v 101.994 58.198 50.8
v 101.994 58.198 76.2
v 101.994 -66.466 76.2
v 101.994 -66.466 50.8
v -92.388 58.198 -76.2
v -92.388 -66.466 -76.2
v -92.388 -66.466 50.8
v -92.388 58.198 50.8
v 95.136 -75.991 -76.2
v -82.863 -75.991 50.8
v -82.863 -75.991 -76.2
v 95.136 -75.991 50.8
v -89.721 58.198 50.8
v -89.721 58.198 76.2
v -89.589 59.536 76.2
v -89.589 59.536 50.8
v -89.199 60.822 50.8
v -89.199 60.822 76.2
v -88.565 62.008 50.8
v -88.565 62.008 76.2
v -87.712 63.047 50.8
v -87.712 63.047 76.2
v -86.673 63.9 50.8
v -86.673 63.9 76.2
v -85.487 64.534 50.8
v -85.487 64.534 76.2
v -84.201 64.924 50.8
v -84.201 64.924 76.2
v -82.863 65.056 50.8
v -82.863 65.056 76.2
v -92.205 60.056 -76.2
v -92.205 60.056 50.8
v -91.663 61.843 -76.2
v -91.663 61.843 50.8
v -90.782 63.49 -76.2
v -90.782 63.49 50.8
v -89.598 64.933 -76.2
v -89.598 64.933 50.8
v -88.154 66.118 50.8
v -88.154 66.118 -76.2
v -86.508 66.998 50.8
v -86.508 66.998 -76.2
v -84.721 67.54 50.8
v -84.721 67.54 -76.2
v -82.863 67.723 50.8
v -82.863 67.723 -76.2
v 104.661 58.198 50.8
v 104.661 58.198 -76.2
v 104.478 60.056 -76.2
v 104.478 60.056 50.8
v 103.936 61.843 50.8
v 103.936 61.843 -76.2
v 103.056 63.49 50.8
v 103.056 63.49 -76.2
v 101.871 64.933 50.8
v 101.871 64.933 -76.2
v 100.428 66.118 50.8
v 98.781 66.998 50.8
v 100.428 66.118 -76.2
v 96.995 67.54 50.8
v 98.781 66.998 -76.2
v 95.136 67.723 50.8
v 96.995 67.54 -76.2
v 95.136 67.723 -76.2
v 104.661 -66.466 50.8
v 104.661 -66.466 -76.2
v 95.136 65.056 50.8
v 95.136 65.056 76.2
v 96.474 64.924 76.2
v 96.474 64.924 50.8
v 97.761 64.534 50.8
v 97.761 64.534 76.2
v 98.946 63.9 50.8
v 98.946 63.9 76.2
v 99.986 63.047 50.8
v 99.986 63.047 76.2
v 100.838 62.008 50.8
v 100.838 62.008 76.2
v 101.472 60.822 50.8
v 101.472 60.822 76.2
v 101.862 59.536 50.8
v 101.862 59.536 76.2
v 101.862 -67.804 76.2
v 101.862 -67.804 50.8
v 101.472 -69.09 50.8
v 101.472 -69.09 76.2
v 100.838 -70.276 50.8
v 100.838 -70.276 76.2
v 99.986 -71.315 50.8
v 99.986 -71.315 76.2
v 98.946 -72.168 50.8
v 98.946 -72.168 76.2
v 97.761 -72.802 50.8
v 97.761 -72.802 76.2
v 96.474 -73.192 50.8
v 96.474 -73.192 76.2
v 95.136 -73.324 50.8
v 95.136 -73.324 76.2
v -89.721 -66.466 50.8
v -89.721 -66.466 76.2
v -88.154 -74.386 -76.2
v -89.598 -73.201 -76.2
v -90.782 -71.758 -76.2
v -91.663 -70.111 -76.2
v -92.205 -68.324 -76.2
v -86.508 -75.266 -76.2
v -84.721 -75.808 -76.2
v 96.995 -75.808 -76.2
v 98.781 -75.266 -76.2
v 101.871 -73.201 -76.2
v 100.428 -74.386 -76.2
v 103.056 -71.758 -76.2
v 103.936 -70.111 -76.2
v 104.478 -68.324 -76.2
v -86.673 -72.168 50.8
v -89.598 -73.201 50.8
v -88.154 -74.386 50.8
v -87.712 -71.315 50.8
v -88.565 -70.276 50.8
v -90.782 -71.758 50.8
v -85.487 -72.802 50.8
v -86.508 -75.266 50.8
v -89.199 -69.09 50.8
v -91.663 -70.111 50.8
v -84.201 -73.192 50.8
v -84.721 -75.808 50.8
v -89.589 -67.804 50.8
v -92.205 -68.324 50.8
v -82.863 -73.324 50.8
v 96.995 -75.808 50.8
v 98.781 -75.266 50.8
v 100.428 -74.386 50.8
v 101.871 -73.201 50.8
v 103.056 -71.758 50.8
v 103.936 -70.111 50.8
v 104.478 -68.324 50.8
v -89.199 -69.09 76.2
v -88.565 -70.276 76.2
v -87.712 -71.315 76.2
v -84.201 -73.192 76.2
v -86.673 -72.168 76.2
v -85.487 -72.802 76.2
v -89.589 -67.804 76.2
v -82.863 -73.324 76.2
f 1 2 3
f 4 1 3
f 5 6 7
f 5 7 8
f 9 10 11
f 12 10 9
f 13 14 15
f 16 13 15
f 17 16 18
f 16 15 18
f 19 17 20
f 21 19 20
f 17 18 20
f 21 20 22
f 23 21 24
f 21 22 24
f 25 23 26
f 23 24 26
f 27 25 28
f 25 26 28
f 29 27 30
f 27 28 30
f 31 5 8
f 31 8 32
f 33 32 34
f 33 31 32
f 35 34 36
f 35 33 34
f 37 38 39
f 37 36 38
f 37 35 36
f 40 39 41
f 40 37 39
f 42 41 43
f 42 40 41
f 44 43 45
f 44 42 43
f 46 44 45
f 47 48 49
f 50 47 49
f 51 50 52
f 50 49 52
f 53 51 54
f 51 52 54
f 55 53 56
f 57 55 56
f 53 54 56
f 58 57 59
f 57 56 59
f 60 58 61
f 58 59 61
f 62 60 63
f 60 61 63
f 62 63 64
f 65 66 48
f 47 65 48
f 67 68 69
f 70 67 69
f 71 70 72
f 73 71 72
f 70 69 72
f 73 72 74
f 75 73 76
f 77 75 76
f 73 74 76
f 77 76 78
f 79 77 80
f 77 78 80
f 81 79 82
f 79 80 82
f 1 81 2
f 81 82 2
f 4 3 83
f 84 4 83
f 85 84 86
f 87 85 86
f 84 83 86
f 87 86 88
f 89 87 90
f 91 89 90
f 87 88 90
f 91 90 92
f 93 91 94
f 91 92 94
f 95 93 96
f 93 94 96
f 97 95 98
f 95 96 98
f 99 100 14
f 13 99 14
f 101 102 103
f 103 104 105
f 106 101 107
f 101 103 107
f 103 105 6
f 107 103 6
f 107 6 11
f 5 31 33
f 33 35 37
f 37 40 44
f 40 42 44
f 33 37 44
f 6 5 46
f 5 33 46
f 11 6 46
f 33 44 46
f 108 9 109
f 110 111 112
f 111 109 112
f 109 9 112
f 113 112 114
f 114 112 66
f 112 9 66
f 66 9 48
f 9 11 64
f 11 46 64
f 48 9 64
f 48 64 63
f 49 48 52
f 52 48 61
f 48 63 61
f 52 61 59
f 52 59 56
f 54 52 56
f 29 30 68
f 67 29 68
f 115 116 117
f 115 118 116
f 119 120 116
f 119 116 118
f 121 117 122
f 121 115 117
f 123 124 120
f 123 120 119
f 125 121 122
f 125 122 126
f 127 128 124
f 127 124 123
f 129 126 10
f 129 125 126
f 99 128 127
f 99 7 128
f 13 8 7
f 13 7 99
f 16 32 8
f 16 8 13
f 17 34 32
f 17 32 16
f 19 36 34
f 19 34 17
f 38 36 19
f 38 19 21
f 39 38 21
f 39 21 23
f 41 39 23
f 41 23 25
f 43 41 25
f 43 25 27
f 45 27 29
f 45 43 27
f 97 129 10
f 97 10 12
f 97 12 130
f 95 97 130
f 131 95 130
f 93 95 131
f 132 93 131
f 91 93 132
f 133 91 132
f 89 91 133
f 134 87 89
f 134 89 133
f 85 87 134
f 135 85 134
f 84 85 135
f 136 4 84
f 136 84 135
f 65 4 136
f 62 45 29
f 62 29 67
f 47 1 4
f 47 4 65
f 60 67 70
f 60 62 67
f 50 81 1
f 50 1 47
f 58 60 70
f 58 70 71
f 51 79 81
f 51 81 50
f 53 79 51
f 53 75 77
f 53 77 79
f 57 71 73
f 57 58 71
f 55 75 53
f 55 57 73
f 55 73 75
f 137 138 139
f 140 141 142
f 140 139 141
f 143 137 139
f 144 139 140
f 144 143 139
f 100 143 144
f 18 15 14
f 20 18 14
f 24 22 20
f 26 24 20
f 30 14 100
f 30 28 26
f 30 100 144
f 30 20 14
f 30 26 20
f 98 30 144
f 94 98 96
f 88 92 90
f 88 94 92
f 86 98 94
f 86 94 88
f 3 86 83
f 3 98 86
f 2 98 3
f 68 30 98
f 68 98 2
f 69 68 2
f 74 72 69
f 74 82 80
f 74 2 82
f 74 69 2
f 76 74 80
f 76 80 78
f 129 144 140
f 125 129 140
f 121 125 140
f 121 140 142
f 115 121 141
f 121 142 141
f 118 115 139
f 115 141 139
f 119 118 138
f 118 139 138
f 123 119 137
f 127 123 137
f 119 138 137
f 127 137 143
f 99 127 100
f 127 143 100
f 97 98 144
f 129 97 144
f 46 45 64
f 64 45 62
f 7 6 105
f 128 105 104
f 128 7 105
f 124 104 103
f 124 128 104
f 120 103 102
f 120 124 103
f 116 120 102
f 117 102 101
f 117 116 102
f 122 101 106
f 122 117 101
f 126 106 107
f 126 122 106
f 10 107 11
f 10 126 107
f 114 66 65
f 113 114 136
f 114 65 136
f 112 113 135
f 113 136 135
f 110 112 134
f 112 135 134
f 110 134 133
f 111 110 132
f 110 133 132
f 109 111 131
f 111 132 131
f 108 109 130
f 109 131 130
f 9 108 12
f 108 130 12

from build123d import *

# Parameters (mm, degrees)
F0_W     = 197.0488578081
F0_H     = 143.7139809132
F1_DEPTH = 76.2
F2_R     = 9.525
F4_DEPTH = 25.4


with BuildPart() as f1:
    # F0 (on Top) → F1 (new body, symmetric)
    with BuildSketch(Plane.XY):
        with Locations((6.136842072, -4.1339993477)):
            Rectangle(F0_W, F0_H)
    extrude(amount=F1_DEPTH, both=True)

    # F2
    f2_edges = [f1.edges().sort_by_distance(p)[0] for p in [
        (-92.387587, -75.99099, 0),
        (-92.387587, 67.722991, 0),
        (104.661271, 67.722991, 0),
        (104.661271, -75.99099, 0),
    ]]
    fillet(f2_edges, radius=F2_R)

    # F3 (on face) → F4 (cut)
    with BuildSketch(Plane.XY.offset(76.2)):
        with BuildLine():
            Line((95.1362709761, 67.7229911089), (-82.862586832, 67.7229911089))
            ThreePointArc((-82.862586832, 67.7229911089), (-89.5977789228, 64.9331831997), (-92.387586832, 58.1979911089))
            Line((-92.387586832, 58.1979911089), (-92.387586832, -66.4659898043))
            ThreePointArc((-92.387586832, -66.4659898043), (-89.5977789228, -73.2011818951), (-82.862586832, -75.9909898043))
            Line((-82.862586832, -75.9909898043), (95.1362709761, -75.9909898043))
            ThreePointArc((95.1362709761, -75.9909898043), (101.8714630669, -73.2011818951), (104.6612709761, -66.4659898043))
            Line((104.6612709761, -66.4659898043), (104.6612709761, 58.1979911089))
            ThreePointArc((104.6612709761, 58.1979911089), (101.8714630669, 64.9331831997), (95.1362709761, 67.7229911089))
        make_face()
        with BuildLine():
            ThreePointArc((-89.720586832, 58.1979911089), (-87.7119251374, 63.0473294143), (-82.862586832, 65.0559911089))
            Line((-82.862586832, 65.0559911089), (95.1362709761, 65.0559911089))
            ThreePointArc((95.1362709761, 65.0559911089), (99.9856092814, 63.0473294143), (101.9942709761, 58.1979911089))
            Line((101.9942709761, 58.1979911089), (101.9942709761, -66.4659898043))
            ThreePointArc((101.9942709761, -66.4659898043), (99.9856092814, -71.3153281096), (95.1362709761, -73.3239898043))
            Line((95.1362709761, -73.3239898043), (-82.862586832, -73.3239898043))
            ThreePointArc((-82.862586832, -73.3239898043), (-87.7119251374, -71.3153281096), (-89.720586832, -66.4659898043))
            Line((-89.720586832, -66.4659898043), (-89.720586832, 58.1979911089))
        make_face(mode=Mode.SUBTRACT)
    extrude(amount=-F4_DEPTH, mode=Mode.SUBTRACT)


solid = f1.part
